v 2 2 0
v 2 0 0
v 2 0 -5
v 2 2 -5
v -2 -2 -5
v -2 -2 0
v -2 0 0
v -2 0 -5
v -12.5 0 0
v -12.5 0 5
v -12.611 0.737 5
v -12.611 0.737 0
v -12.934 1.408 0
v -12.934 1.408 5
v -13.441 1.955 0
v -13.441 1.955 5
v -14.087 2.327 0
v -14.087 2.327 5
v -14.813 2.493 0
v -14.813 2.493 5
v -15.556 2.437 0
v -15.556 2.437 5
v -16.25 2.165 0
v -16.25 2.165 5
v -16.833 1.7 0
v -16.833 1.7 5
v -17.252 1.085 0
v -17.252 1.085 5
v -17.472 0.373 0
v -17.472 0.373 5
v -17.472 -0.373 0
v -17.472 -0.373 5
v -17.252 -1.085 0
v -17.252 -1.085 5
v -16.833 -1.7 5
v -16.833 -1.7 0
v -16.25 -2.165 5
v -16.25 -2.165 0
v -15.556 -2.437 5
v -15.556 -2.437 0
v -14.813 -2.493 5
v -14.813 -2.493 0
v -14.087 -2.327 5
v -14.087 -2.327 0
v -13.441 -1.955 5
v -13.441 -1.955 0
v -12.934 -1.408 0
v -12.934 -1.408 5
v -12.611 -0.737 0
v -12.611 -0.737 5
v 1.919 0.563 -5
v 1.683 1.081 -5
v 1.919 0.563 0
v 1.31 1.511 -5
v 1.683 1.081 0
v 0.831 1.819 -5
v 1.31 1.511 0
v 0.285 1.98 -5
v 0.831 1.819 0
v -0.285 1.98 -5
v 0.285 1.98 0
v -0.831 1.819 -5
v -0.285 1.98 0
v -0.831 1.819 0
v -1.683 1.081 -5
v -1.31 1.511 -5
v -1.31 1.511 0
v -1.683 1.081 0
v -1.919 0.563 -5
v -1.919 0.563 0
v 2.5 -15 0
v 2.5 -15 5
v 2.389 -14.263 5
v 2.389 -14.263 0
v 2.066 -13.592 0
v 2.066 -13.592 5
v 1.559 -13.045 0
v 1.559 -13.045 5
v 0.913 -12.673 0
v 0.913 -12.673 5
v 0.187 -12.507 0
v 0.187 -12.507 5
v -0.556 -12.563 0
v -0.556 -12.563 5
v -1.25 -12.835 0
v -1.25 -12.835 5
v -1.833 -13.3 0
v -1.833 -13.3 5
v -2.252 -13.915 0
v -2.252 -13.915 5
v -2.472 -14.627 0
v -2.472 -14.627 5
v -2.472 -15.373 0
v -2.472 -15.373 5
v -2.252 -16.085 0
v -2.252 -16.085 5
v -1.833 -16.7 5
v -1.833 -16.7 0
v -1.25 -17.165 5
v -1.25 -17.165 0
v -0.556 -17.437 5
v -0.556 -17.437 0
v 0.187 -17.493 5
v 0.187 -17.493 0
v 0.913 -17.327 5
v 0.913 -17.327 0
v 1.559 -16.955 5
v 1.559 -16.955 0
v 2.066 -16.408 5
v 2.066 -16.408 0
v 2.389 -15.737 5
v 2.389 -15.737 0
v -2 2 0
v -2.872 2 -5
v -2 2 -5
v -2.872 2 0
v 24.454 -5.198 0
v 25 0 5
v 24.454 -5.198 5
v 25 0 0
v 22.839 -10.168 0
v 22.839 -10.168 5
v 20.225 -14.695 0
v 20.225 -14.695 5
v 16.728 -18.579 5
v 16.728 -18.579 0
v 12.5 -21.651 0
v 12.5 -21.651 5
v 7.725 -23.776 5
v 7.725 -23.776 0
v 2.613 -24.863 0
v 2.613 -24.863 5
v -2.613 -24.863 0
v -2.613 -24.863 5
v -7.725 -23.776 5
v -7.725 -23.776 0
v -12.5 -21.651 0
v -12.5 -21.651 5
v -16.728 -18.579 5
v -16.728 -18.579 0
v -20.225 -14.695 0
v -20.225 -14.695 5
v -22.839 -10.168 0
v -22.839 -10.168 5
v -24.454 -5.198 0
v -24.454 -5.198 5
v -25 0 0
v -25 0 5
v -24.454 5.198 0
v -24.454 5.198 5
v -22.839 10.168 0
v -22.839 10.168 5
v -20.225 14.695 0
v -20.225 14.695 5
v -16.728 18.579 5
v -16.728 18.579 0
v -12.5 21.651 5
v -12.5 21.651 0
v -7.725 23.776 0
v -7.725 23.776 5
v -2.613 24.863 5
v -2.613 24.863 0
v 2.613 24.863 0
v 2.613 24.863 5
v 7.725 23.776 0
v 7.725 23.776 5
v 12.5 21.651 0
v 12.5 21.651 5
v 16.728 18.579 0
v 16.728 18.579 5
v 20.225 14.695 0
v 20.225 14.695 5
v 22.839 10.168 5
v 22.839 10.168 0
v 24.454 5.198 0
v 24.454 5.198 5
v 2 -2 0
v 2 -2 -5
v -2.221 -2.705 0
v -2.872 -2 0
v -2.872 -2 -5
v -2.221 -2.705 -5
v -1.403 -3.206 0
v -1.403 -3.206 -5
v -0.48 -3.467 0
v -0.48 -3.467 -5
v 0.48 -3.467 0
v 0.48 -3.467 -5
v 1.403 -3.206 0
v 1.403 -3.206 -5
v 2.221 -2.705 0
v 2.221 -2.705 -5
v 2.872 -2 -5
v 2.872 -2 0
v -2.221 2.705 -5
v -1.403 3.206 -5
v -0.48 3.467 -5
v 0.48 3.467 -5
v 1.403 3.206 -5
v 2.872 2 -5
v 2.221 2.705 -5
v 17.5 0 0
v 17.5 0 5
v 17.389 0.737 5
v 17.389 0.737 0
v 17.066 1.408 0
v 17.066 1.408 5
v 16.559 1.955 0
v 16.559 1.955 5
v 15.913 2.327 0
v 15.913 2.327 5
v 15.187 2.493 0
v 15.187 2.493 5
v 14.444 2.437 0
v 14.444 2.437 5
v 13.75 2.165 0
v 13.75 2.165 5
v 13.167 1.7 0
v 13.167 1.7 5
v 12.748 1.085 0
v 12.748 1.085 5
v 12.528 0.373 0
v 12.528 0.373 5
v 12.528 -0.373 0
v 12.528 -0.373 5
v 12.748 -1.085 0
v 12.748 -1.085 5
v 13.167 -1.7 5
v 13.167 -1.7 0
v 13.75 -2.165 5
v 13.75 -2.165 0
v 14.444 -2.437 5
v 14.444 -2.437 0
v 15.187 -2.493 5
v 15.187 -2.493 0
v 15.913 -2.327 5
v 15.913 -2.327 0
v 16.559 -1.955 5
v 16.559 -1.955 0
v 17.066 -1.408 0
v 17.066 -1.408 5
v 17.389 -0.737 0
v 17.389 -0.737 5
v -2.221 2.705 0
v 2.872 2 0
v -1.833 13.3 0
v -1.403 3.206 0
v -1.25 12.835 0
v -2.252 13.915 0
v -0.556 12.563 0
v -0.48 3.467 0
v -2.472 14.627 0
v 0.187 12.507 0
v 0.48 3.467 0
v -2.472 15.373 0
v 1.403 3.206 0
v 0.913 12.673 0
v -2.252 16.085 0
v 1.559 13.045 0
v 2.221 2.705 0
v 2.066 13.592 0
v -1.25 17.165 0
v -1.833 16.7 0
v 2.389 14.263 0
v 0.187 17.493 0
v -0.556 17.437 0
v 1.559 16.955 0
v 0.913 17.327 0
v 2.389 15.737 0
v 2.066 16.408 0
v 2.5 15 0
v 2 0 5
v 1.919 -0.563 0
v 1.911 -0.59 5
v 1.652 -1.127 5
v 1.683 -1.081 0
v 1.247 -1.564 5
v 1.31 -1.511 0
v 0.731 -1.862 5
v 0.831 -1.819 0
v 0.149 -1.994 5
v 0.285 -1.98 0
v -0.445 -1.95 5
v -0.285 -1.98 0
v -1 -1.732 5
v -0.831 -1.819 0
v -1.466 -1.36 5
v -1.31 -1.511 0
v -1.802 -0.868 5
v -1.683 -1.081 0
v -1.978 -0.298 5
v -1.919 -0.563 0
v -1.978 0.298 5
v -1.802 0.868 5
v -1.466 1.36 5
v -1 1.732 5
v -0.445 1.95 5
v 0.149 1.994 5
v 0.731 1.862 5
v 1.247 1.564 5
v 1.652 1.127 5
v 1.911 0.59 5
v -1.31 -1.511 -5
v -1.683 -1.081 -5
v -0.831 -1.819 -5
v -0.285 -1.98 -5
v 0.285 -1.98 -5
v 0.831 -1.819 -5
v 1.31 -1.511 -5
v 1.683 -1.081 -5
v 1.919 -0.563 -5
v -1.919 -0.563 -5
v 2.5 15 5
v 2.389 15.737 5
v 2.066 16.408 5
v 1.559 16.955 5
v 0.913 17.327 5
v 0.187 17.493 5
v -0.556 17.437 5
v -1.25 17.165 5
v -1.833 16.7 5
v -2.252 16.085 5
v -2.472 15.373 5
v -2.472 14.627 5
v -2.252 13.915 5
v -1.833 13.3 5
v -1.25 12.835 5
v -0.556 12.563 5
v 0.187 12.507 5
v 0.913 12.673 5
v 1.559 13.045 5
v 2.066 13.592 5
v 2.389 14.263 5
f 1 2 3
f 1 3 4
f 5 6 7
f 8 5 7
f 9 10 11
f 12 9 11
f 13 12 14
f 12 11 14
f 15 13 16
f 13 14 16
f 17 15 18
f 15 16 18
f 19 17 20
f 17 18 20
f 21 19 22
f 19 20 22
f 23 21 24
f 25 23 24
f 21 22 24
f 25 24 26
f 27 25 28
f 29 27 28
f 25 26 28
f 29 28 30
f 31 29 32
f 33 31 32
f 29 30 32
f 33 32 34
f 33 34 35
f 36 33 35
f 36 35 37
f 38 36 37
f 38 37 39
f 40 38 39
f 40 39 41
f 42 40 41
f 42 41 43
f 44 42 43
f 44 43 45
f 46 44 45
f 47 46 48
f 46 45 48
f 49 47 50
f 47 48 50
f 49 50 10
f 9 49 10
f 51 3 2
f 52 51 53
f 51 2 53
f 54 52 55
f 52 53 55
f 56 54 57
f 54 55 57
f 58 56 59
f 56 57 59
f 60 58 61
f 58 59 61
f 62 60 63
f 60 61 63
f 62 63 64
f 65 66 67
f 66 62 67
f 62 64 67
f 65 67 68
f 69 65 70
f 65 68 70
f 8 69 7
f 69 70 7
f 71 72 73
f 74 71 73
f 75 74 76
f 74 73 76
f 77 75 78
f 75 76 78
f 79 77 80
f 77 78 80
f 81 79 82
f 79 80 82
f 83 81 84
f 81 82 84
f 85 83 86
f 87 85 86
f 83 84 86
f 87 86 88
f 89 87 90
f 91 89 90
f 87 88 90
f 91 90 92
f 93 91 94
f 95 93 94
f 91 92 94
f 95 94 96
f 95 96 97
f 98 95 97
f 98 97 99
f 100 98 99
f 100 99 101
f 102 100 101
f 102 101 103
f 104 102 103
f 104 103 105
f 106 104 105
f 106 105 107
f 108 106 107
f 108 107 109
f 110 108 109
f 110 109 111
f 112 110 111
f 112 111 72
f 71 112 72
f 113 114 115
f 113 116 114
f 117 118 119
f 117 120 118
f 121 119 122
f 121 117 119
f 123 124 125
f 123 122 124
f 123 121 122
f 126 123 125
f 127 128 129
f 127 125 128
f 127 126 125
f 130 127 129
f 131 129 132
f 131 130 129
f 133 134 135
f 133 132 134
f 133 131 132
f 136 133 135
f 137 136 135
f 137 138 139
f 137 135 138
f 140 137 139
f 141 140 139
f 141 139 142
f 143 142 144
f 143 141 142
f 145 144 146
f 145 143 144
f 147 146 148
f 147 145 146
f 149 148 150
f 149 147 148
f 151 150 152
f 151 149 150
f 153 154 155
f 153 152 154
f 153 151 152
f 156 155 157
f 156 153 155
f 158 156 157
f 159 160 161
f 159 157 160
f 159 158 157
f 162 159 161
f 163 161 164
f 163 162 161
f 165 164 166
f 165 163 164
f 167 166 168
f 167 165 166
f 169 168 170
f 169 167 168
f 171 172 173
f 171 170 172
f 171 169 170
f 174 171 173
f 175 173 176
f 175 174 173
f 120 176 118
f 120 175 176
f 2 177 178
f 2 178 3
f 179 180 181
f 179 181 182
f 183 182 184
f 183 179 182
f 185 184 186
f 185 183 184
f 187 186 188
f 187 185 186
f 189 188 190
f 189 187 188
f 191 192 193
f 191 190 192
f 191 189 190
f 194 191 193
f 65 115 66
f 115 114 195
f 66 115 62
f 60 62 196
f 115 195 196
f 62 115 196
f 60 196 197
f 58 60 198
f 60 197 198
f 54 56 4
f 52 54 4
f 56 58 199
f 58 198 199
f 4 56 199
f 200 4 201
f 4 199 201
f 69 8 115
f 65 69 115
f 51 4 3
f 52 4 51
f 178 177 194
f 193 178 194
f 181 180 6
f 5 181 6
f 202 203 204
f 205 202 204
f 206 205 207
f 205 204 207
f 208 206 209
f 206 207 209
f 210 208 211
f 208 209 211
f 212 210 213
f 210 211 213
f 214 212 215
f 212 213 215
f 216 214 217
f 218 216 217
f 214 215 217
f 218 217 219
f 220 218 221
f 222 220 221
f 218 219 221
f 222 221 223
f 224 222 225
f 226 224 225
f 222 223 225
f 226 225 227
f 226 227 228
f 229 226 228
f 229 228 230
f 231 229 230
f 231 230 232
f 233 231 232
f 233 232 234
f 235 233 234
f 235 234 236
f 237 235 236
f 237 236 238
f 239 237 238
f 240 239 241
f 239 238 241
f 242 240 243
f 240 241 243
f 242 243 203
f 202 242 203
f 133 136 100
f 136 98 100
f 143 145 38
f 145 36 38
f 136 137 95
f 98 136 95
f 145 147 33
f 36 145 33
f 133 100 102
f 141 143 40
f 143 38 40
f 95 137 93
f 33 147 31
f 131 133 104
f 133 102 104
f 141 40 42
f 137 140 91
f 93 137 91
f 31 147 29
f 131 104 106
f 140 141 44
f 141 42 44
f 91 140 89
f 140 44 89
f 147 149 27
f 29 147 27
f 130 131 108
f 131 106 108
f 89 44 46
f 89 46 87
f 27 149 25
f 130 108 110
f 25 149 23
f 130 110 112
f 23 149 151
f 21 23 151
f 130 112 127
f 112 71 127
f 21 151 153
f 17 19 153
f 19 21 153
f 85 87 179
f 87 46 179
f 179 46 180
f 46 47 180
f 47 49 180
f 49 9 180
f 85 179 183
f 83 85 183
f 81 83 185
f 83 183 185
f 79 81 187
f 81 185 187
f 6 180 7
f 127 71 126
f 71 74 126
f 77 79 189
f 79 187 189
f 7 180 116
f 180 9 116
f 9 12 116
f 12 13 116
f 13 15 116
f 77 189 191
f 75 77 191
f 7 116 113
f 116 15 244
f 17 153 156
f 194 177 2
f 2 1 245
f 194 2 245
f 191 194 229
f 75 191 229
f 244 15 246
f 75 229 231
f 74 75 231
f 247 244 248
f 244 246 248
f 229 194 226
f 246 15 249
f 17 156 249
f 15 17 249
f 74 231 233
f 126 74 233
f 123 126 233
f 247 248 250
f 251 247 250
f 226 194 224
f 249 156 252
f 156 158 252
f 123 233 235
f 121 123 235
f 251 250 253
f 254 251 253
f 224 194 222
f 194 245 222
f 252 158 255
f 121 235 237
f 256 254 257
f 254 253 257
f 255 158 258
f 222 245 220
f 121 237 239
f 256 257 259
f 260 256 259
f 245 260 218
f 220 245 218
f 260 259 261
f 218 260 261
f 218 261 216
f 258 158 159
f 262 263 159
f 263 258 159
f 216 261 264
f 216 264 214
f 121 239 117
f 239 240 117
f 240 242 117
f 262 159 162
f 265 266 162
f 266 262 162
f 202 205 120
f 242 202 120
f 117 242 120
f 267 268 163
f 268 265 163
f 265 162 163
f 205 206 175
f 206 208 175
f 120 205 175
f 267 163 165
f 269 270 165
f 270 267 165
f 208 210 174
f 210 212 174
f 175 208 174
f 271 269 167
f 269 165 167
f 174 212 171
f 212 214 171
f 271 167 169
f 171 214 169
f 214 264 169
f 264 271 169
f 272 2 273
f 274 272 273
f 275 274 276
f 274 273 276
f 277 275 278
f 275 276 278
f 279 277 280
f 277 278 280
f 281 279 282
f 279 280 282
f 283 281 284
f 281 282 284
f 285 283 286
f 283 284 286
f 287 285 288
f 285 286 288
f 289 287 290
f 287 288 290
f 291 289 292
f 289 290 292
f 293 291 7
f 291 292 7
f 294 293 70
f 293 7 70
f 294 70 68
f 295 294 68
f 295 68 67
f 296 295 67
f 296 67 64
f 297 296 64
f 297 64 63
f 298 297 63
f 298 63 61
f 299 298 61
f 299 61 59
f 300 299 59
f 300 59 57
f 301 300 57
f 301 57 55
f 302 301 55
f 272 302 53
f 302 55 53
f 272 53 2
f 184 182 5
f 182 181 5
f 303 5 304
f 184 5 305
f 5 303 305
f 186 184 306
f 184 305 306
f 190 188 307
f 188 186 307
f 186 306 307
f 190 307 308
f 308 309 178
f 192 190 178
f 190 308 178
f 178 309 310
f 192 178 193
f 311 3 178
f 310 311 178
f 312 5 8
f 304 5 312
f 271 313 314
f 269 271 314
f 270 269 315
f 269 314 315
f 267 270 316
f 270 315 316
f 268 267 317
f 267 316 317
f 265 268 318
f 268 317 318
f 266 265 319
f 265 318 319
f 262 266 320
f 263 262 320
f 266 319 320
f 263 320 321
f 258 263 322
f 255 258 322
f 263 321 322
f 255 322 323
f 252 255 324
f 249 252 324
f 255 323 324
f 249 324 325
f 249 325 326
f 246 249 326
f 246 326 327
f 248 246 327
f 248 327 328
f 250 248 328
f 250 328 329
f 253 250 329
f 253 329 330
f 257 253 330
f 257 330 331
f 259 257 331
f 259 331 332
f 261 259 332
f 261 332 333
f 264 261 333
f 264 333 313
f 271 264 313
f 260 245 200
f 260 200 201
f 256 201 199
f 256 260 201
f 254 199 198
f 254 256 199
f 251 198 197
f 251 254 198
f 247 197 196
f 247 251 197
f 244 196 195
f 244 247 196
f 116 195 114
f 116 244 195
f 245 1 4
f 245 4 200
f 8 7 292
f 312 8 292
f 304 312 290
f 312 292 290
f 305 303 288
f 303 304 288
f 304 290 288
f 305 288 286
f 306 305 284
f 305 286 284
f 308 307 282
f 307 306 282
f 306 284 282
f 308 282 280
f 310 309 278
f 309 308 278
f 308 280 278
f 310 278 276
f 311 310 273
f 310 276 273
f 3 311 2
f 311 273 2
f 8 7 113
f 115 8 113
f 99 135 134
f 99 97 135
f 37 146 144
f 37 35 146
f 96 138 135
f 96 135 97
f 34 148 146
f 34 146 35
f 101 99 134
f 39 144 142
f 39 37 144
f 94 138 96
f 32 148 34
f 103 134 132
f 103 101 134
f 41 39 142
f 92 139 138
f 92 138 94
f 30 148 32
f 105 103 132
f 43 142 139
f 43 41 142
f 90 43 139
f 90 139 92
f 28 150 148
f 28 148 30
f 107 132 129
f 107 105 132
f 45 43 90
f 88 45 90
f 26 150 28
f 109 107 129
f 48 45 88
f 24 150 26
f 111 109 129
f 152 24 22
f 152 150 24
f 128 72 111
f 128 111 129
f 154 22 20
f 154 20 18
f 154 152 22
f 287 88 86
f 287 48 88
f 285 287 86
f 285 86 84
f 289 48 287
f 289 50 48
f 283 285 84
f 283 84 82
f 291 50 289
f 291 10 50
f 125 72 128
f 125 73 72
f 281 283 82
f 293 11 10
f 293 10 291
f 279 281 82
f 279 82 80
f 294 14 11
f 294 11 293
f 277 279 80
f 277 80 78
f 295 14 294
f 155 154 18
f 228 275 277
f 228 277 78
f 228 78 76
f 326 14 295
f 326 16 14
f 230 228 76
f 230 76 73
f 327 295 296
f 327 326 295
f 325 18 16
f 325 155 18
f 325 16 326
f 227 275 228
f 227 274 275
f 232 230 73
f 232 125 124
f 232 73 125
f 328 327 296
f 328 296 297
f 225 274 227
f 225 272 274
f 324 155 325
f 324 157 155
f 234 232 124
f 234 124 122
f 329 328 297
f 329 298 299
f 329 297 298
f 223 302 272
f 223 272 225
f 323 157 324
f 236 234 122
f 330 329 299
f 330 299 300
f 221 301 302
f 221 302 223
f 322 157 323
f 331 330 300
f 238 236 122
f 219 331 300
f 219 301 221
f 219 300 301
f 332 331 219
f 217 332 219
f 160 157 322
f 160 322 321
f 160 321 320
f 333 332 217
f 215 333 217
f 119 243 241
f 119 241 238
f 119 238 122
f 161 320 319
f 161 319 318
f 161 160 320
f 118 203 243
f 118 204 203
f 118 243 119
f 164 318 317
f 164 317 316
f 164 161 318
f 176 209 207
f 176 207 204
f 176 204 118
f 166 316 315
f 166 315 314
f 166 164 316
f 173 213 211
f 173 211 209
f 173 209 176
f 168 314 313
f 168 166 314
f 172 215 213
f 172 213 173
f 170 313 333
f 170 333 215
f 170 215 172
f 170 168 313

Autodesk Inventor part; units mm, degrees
ref_plane "YZ Plane" through (0, 0, 0) normal (1, 0, 0) x (0, 1, 0)
ref_plane "XZ Plane" through (0, 0, 0) normal (0, 1, 0) x (-1, 0, 0)
ref_plane "XY Plane" through (0, 0, 0) normal (0, 0, 1) x (1, 0, 0)
sketch "Sketch1" plane through (0, 0, 0) normal (0, 0, 1) x (1, 0, 0)
  circle A0 centre (0, 0) radius 2
  circle A1 centre (0, 0) radius 25
  circle A2 centre (0, 0) radius 3.5
  line L0 (-2, -2.8723) -> (-2, 2.8723)
  line L1 (-2.8723, 2) -> (2.8723, 2)
  line L2 (-2.8723, -2) -> (2.8723, -2)
  line L3 (2, -2.8723) -> (2, 2.8723)
  point P0 (2, -2)
  point P1 (2, 0)
  point P2 (-2, 0)
  point P3 (-2, -2)
  point P4 (2, 2)
  point P5 (-2, 2)
  dimension "d4" = 7
  dimension "d0" = 4
  dimension "d1" = 50
extrude "Extrusion1" add sketch "Sketch1" along normal blind 5 contours L3 L2 A0 | L3 L1 A2 L2 | A0 L1 L3 | A0 L0 L1 | L1 L0 A2 L3 | L2 L0 A0 | L2 L3 A2 L0 | L2 A2 L3 | L3 A2 L1 | L0 L2 A2 L1 | L1 A2 L0 | L0 A2 L2 | A1
extrude "Extrusion2" add sketch "Sketch1" against normal blind 5 contours L3 L2 A0 | A0 L1 L3 | A0 L0 L1 | L1 L0 A2 L3 | L2 L0 A0 | L2 L3 A2 L0 | L2 A2 L3 | L3 A2 L1 | L1 A2 L0 | L0 A2 L2
sketch "Sketch2" plane through (0, 0, 5) normal (0, 0, 1) x (1, 0, 0)
  circle A0 centre (0, 0) radius 2 projected
  circle A1 centre (0, 0) radius 15
  circle A2 centre (-15, 0) radius 2.5
  circle A3 centre (0, 15) radius 2.5
  circle A4 centre (15, 0) radius 2.5
  circle A5 centre (0, -15) radius 2.5
  dimension "d7" = 30
  dimension "d8" = 5
  dimension "d9" = 5
  dimension "d10" = 5
  dimension "d11" = 5
extrude "Extrusion3" cut sketch "Sketch2" against normal through all contours A1 A4 | A1 A4 | A3 A1 | A1 A3 | A5 A1 | A1 A5 | A2 A1 | A1 A2
